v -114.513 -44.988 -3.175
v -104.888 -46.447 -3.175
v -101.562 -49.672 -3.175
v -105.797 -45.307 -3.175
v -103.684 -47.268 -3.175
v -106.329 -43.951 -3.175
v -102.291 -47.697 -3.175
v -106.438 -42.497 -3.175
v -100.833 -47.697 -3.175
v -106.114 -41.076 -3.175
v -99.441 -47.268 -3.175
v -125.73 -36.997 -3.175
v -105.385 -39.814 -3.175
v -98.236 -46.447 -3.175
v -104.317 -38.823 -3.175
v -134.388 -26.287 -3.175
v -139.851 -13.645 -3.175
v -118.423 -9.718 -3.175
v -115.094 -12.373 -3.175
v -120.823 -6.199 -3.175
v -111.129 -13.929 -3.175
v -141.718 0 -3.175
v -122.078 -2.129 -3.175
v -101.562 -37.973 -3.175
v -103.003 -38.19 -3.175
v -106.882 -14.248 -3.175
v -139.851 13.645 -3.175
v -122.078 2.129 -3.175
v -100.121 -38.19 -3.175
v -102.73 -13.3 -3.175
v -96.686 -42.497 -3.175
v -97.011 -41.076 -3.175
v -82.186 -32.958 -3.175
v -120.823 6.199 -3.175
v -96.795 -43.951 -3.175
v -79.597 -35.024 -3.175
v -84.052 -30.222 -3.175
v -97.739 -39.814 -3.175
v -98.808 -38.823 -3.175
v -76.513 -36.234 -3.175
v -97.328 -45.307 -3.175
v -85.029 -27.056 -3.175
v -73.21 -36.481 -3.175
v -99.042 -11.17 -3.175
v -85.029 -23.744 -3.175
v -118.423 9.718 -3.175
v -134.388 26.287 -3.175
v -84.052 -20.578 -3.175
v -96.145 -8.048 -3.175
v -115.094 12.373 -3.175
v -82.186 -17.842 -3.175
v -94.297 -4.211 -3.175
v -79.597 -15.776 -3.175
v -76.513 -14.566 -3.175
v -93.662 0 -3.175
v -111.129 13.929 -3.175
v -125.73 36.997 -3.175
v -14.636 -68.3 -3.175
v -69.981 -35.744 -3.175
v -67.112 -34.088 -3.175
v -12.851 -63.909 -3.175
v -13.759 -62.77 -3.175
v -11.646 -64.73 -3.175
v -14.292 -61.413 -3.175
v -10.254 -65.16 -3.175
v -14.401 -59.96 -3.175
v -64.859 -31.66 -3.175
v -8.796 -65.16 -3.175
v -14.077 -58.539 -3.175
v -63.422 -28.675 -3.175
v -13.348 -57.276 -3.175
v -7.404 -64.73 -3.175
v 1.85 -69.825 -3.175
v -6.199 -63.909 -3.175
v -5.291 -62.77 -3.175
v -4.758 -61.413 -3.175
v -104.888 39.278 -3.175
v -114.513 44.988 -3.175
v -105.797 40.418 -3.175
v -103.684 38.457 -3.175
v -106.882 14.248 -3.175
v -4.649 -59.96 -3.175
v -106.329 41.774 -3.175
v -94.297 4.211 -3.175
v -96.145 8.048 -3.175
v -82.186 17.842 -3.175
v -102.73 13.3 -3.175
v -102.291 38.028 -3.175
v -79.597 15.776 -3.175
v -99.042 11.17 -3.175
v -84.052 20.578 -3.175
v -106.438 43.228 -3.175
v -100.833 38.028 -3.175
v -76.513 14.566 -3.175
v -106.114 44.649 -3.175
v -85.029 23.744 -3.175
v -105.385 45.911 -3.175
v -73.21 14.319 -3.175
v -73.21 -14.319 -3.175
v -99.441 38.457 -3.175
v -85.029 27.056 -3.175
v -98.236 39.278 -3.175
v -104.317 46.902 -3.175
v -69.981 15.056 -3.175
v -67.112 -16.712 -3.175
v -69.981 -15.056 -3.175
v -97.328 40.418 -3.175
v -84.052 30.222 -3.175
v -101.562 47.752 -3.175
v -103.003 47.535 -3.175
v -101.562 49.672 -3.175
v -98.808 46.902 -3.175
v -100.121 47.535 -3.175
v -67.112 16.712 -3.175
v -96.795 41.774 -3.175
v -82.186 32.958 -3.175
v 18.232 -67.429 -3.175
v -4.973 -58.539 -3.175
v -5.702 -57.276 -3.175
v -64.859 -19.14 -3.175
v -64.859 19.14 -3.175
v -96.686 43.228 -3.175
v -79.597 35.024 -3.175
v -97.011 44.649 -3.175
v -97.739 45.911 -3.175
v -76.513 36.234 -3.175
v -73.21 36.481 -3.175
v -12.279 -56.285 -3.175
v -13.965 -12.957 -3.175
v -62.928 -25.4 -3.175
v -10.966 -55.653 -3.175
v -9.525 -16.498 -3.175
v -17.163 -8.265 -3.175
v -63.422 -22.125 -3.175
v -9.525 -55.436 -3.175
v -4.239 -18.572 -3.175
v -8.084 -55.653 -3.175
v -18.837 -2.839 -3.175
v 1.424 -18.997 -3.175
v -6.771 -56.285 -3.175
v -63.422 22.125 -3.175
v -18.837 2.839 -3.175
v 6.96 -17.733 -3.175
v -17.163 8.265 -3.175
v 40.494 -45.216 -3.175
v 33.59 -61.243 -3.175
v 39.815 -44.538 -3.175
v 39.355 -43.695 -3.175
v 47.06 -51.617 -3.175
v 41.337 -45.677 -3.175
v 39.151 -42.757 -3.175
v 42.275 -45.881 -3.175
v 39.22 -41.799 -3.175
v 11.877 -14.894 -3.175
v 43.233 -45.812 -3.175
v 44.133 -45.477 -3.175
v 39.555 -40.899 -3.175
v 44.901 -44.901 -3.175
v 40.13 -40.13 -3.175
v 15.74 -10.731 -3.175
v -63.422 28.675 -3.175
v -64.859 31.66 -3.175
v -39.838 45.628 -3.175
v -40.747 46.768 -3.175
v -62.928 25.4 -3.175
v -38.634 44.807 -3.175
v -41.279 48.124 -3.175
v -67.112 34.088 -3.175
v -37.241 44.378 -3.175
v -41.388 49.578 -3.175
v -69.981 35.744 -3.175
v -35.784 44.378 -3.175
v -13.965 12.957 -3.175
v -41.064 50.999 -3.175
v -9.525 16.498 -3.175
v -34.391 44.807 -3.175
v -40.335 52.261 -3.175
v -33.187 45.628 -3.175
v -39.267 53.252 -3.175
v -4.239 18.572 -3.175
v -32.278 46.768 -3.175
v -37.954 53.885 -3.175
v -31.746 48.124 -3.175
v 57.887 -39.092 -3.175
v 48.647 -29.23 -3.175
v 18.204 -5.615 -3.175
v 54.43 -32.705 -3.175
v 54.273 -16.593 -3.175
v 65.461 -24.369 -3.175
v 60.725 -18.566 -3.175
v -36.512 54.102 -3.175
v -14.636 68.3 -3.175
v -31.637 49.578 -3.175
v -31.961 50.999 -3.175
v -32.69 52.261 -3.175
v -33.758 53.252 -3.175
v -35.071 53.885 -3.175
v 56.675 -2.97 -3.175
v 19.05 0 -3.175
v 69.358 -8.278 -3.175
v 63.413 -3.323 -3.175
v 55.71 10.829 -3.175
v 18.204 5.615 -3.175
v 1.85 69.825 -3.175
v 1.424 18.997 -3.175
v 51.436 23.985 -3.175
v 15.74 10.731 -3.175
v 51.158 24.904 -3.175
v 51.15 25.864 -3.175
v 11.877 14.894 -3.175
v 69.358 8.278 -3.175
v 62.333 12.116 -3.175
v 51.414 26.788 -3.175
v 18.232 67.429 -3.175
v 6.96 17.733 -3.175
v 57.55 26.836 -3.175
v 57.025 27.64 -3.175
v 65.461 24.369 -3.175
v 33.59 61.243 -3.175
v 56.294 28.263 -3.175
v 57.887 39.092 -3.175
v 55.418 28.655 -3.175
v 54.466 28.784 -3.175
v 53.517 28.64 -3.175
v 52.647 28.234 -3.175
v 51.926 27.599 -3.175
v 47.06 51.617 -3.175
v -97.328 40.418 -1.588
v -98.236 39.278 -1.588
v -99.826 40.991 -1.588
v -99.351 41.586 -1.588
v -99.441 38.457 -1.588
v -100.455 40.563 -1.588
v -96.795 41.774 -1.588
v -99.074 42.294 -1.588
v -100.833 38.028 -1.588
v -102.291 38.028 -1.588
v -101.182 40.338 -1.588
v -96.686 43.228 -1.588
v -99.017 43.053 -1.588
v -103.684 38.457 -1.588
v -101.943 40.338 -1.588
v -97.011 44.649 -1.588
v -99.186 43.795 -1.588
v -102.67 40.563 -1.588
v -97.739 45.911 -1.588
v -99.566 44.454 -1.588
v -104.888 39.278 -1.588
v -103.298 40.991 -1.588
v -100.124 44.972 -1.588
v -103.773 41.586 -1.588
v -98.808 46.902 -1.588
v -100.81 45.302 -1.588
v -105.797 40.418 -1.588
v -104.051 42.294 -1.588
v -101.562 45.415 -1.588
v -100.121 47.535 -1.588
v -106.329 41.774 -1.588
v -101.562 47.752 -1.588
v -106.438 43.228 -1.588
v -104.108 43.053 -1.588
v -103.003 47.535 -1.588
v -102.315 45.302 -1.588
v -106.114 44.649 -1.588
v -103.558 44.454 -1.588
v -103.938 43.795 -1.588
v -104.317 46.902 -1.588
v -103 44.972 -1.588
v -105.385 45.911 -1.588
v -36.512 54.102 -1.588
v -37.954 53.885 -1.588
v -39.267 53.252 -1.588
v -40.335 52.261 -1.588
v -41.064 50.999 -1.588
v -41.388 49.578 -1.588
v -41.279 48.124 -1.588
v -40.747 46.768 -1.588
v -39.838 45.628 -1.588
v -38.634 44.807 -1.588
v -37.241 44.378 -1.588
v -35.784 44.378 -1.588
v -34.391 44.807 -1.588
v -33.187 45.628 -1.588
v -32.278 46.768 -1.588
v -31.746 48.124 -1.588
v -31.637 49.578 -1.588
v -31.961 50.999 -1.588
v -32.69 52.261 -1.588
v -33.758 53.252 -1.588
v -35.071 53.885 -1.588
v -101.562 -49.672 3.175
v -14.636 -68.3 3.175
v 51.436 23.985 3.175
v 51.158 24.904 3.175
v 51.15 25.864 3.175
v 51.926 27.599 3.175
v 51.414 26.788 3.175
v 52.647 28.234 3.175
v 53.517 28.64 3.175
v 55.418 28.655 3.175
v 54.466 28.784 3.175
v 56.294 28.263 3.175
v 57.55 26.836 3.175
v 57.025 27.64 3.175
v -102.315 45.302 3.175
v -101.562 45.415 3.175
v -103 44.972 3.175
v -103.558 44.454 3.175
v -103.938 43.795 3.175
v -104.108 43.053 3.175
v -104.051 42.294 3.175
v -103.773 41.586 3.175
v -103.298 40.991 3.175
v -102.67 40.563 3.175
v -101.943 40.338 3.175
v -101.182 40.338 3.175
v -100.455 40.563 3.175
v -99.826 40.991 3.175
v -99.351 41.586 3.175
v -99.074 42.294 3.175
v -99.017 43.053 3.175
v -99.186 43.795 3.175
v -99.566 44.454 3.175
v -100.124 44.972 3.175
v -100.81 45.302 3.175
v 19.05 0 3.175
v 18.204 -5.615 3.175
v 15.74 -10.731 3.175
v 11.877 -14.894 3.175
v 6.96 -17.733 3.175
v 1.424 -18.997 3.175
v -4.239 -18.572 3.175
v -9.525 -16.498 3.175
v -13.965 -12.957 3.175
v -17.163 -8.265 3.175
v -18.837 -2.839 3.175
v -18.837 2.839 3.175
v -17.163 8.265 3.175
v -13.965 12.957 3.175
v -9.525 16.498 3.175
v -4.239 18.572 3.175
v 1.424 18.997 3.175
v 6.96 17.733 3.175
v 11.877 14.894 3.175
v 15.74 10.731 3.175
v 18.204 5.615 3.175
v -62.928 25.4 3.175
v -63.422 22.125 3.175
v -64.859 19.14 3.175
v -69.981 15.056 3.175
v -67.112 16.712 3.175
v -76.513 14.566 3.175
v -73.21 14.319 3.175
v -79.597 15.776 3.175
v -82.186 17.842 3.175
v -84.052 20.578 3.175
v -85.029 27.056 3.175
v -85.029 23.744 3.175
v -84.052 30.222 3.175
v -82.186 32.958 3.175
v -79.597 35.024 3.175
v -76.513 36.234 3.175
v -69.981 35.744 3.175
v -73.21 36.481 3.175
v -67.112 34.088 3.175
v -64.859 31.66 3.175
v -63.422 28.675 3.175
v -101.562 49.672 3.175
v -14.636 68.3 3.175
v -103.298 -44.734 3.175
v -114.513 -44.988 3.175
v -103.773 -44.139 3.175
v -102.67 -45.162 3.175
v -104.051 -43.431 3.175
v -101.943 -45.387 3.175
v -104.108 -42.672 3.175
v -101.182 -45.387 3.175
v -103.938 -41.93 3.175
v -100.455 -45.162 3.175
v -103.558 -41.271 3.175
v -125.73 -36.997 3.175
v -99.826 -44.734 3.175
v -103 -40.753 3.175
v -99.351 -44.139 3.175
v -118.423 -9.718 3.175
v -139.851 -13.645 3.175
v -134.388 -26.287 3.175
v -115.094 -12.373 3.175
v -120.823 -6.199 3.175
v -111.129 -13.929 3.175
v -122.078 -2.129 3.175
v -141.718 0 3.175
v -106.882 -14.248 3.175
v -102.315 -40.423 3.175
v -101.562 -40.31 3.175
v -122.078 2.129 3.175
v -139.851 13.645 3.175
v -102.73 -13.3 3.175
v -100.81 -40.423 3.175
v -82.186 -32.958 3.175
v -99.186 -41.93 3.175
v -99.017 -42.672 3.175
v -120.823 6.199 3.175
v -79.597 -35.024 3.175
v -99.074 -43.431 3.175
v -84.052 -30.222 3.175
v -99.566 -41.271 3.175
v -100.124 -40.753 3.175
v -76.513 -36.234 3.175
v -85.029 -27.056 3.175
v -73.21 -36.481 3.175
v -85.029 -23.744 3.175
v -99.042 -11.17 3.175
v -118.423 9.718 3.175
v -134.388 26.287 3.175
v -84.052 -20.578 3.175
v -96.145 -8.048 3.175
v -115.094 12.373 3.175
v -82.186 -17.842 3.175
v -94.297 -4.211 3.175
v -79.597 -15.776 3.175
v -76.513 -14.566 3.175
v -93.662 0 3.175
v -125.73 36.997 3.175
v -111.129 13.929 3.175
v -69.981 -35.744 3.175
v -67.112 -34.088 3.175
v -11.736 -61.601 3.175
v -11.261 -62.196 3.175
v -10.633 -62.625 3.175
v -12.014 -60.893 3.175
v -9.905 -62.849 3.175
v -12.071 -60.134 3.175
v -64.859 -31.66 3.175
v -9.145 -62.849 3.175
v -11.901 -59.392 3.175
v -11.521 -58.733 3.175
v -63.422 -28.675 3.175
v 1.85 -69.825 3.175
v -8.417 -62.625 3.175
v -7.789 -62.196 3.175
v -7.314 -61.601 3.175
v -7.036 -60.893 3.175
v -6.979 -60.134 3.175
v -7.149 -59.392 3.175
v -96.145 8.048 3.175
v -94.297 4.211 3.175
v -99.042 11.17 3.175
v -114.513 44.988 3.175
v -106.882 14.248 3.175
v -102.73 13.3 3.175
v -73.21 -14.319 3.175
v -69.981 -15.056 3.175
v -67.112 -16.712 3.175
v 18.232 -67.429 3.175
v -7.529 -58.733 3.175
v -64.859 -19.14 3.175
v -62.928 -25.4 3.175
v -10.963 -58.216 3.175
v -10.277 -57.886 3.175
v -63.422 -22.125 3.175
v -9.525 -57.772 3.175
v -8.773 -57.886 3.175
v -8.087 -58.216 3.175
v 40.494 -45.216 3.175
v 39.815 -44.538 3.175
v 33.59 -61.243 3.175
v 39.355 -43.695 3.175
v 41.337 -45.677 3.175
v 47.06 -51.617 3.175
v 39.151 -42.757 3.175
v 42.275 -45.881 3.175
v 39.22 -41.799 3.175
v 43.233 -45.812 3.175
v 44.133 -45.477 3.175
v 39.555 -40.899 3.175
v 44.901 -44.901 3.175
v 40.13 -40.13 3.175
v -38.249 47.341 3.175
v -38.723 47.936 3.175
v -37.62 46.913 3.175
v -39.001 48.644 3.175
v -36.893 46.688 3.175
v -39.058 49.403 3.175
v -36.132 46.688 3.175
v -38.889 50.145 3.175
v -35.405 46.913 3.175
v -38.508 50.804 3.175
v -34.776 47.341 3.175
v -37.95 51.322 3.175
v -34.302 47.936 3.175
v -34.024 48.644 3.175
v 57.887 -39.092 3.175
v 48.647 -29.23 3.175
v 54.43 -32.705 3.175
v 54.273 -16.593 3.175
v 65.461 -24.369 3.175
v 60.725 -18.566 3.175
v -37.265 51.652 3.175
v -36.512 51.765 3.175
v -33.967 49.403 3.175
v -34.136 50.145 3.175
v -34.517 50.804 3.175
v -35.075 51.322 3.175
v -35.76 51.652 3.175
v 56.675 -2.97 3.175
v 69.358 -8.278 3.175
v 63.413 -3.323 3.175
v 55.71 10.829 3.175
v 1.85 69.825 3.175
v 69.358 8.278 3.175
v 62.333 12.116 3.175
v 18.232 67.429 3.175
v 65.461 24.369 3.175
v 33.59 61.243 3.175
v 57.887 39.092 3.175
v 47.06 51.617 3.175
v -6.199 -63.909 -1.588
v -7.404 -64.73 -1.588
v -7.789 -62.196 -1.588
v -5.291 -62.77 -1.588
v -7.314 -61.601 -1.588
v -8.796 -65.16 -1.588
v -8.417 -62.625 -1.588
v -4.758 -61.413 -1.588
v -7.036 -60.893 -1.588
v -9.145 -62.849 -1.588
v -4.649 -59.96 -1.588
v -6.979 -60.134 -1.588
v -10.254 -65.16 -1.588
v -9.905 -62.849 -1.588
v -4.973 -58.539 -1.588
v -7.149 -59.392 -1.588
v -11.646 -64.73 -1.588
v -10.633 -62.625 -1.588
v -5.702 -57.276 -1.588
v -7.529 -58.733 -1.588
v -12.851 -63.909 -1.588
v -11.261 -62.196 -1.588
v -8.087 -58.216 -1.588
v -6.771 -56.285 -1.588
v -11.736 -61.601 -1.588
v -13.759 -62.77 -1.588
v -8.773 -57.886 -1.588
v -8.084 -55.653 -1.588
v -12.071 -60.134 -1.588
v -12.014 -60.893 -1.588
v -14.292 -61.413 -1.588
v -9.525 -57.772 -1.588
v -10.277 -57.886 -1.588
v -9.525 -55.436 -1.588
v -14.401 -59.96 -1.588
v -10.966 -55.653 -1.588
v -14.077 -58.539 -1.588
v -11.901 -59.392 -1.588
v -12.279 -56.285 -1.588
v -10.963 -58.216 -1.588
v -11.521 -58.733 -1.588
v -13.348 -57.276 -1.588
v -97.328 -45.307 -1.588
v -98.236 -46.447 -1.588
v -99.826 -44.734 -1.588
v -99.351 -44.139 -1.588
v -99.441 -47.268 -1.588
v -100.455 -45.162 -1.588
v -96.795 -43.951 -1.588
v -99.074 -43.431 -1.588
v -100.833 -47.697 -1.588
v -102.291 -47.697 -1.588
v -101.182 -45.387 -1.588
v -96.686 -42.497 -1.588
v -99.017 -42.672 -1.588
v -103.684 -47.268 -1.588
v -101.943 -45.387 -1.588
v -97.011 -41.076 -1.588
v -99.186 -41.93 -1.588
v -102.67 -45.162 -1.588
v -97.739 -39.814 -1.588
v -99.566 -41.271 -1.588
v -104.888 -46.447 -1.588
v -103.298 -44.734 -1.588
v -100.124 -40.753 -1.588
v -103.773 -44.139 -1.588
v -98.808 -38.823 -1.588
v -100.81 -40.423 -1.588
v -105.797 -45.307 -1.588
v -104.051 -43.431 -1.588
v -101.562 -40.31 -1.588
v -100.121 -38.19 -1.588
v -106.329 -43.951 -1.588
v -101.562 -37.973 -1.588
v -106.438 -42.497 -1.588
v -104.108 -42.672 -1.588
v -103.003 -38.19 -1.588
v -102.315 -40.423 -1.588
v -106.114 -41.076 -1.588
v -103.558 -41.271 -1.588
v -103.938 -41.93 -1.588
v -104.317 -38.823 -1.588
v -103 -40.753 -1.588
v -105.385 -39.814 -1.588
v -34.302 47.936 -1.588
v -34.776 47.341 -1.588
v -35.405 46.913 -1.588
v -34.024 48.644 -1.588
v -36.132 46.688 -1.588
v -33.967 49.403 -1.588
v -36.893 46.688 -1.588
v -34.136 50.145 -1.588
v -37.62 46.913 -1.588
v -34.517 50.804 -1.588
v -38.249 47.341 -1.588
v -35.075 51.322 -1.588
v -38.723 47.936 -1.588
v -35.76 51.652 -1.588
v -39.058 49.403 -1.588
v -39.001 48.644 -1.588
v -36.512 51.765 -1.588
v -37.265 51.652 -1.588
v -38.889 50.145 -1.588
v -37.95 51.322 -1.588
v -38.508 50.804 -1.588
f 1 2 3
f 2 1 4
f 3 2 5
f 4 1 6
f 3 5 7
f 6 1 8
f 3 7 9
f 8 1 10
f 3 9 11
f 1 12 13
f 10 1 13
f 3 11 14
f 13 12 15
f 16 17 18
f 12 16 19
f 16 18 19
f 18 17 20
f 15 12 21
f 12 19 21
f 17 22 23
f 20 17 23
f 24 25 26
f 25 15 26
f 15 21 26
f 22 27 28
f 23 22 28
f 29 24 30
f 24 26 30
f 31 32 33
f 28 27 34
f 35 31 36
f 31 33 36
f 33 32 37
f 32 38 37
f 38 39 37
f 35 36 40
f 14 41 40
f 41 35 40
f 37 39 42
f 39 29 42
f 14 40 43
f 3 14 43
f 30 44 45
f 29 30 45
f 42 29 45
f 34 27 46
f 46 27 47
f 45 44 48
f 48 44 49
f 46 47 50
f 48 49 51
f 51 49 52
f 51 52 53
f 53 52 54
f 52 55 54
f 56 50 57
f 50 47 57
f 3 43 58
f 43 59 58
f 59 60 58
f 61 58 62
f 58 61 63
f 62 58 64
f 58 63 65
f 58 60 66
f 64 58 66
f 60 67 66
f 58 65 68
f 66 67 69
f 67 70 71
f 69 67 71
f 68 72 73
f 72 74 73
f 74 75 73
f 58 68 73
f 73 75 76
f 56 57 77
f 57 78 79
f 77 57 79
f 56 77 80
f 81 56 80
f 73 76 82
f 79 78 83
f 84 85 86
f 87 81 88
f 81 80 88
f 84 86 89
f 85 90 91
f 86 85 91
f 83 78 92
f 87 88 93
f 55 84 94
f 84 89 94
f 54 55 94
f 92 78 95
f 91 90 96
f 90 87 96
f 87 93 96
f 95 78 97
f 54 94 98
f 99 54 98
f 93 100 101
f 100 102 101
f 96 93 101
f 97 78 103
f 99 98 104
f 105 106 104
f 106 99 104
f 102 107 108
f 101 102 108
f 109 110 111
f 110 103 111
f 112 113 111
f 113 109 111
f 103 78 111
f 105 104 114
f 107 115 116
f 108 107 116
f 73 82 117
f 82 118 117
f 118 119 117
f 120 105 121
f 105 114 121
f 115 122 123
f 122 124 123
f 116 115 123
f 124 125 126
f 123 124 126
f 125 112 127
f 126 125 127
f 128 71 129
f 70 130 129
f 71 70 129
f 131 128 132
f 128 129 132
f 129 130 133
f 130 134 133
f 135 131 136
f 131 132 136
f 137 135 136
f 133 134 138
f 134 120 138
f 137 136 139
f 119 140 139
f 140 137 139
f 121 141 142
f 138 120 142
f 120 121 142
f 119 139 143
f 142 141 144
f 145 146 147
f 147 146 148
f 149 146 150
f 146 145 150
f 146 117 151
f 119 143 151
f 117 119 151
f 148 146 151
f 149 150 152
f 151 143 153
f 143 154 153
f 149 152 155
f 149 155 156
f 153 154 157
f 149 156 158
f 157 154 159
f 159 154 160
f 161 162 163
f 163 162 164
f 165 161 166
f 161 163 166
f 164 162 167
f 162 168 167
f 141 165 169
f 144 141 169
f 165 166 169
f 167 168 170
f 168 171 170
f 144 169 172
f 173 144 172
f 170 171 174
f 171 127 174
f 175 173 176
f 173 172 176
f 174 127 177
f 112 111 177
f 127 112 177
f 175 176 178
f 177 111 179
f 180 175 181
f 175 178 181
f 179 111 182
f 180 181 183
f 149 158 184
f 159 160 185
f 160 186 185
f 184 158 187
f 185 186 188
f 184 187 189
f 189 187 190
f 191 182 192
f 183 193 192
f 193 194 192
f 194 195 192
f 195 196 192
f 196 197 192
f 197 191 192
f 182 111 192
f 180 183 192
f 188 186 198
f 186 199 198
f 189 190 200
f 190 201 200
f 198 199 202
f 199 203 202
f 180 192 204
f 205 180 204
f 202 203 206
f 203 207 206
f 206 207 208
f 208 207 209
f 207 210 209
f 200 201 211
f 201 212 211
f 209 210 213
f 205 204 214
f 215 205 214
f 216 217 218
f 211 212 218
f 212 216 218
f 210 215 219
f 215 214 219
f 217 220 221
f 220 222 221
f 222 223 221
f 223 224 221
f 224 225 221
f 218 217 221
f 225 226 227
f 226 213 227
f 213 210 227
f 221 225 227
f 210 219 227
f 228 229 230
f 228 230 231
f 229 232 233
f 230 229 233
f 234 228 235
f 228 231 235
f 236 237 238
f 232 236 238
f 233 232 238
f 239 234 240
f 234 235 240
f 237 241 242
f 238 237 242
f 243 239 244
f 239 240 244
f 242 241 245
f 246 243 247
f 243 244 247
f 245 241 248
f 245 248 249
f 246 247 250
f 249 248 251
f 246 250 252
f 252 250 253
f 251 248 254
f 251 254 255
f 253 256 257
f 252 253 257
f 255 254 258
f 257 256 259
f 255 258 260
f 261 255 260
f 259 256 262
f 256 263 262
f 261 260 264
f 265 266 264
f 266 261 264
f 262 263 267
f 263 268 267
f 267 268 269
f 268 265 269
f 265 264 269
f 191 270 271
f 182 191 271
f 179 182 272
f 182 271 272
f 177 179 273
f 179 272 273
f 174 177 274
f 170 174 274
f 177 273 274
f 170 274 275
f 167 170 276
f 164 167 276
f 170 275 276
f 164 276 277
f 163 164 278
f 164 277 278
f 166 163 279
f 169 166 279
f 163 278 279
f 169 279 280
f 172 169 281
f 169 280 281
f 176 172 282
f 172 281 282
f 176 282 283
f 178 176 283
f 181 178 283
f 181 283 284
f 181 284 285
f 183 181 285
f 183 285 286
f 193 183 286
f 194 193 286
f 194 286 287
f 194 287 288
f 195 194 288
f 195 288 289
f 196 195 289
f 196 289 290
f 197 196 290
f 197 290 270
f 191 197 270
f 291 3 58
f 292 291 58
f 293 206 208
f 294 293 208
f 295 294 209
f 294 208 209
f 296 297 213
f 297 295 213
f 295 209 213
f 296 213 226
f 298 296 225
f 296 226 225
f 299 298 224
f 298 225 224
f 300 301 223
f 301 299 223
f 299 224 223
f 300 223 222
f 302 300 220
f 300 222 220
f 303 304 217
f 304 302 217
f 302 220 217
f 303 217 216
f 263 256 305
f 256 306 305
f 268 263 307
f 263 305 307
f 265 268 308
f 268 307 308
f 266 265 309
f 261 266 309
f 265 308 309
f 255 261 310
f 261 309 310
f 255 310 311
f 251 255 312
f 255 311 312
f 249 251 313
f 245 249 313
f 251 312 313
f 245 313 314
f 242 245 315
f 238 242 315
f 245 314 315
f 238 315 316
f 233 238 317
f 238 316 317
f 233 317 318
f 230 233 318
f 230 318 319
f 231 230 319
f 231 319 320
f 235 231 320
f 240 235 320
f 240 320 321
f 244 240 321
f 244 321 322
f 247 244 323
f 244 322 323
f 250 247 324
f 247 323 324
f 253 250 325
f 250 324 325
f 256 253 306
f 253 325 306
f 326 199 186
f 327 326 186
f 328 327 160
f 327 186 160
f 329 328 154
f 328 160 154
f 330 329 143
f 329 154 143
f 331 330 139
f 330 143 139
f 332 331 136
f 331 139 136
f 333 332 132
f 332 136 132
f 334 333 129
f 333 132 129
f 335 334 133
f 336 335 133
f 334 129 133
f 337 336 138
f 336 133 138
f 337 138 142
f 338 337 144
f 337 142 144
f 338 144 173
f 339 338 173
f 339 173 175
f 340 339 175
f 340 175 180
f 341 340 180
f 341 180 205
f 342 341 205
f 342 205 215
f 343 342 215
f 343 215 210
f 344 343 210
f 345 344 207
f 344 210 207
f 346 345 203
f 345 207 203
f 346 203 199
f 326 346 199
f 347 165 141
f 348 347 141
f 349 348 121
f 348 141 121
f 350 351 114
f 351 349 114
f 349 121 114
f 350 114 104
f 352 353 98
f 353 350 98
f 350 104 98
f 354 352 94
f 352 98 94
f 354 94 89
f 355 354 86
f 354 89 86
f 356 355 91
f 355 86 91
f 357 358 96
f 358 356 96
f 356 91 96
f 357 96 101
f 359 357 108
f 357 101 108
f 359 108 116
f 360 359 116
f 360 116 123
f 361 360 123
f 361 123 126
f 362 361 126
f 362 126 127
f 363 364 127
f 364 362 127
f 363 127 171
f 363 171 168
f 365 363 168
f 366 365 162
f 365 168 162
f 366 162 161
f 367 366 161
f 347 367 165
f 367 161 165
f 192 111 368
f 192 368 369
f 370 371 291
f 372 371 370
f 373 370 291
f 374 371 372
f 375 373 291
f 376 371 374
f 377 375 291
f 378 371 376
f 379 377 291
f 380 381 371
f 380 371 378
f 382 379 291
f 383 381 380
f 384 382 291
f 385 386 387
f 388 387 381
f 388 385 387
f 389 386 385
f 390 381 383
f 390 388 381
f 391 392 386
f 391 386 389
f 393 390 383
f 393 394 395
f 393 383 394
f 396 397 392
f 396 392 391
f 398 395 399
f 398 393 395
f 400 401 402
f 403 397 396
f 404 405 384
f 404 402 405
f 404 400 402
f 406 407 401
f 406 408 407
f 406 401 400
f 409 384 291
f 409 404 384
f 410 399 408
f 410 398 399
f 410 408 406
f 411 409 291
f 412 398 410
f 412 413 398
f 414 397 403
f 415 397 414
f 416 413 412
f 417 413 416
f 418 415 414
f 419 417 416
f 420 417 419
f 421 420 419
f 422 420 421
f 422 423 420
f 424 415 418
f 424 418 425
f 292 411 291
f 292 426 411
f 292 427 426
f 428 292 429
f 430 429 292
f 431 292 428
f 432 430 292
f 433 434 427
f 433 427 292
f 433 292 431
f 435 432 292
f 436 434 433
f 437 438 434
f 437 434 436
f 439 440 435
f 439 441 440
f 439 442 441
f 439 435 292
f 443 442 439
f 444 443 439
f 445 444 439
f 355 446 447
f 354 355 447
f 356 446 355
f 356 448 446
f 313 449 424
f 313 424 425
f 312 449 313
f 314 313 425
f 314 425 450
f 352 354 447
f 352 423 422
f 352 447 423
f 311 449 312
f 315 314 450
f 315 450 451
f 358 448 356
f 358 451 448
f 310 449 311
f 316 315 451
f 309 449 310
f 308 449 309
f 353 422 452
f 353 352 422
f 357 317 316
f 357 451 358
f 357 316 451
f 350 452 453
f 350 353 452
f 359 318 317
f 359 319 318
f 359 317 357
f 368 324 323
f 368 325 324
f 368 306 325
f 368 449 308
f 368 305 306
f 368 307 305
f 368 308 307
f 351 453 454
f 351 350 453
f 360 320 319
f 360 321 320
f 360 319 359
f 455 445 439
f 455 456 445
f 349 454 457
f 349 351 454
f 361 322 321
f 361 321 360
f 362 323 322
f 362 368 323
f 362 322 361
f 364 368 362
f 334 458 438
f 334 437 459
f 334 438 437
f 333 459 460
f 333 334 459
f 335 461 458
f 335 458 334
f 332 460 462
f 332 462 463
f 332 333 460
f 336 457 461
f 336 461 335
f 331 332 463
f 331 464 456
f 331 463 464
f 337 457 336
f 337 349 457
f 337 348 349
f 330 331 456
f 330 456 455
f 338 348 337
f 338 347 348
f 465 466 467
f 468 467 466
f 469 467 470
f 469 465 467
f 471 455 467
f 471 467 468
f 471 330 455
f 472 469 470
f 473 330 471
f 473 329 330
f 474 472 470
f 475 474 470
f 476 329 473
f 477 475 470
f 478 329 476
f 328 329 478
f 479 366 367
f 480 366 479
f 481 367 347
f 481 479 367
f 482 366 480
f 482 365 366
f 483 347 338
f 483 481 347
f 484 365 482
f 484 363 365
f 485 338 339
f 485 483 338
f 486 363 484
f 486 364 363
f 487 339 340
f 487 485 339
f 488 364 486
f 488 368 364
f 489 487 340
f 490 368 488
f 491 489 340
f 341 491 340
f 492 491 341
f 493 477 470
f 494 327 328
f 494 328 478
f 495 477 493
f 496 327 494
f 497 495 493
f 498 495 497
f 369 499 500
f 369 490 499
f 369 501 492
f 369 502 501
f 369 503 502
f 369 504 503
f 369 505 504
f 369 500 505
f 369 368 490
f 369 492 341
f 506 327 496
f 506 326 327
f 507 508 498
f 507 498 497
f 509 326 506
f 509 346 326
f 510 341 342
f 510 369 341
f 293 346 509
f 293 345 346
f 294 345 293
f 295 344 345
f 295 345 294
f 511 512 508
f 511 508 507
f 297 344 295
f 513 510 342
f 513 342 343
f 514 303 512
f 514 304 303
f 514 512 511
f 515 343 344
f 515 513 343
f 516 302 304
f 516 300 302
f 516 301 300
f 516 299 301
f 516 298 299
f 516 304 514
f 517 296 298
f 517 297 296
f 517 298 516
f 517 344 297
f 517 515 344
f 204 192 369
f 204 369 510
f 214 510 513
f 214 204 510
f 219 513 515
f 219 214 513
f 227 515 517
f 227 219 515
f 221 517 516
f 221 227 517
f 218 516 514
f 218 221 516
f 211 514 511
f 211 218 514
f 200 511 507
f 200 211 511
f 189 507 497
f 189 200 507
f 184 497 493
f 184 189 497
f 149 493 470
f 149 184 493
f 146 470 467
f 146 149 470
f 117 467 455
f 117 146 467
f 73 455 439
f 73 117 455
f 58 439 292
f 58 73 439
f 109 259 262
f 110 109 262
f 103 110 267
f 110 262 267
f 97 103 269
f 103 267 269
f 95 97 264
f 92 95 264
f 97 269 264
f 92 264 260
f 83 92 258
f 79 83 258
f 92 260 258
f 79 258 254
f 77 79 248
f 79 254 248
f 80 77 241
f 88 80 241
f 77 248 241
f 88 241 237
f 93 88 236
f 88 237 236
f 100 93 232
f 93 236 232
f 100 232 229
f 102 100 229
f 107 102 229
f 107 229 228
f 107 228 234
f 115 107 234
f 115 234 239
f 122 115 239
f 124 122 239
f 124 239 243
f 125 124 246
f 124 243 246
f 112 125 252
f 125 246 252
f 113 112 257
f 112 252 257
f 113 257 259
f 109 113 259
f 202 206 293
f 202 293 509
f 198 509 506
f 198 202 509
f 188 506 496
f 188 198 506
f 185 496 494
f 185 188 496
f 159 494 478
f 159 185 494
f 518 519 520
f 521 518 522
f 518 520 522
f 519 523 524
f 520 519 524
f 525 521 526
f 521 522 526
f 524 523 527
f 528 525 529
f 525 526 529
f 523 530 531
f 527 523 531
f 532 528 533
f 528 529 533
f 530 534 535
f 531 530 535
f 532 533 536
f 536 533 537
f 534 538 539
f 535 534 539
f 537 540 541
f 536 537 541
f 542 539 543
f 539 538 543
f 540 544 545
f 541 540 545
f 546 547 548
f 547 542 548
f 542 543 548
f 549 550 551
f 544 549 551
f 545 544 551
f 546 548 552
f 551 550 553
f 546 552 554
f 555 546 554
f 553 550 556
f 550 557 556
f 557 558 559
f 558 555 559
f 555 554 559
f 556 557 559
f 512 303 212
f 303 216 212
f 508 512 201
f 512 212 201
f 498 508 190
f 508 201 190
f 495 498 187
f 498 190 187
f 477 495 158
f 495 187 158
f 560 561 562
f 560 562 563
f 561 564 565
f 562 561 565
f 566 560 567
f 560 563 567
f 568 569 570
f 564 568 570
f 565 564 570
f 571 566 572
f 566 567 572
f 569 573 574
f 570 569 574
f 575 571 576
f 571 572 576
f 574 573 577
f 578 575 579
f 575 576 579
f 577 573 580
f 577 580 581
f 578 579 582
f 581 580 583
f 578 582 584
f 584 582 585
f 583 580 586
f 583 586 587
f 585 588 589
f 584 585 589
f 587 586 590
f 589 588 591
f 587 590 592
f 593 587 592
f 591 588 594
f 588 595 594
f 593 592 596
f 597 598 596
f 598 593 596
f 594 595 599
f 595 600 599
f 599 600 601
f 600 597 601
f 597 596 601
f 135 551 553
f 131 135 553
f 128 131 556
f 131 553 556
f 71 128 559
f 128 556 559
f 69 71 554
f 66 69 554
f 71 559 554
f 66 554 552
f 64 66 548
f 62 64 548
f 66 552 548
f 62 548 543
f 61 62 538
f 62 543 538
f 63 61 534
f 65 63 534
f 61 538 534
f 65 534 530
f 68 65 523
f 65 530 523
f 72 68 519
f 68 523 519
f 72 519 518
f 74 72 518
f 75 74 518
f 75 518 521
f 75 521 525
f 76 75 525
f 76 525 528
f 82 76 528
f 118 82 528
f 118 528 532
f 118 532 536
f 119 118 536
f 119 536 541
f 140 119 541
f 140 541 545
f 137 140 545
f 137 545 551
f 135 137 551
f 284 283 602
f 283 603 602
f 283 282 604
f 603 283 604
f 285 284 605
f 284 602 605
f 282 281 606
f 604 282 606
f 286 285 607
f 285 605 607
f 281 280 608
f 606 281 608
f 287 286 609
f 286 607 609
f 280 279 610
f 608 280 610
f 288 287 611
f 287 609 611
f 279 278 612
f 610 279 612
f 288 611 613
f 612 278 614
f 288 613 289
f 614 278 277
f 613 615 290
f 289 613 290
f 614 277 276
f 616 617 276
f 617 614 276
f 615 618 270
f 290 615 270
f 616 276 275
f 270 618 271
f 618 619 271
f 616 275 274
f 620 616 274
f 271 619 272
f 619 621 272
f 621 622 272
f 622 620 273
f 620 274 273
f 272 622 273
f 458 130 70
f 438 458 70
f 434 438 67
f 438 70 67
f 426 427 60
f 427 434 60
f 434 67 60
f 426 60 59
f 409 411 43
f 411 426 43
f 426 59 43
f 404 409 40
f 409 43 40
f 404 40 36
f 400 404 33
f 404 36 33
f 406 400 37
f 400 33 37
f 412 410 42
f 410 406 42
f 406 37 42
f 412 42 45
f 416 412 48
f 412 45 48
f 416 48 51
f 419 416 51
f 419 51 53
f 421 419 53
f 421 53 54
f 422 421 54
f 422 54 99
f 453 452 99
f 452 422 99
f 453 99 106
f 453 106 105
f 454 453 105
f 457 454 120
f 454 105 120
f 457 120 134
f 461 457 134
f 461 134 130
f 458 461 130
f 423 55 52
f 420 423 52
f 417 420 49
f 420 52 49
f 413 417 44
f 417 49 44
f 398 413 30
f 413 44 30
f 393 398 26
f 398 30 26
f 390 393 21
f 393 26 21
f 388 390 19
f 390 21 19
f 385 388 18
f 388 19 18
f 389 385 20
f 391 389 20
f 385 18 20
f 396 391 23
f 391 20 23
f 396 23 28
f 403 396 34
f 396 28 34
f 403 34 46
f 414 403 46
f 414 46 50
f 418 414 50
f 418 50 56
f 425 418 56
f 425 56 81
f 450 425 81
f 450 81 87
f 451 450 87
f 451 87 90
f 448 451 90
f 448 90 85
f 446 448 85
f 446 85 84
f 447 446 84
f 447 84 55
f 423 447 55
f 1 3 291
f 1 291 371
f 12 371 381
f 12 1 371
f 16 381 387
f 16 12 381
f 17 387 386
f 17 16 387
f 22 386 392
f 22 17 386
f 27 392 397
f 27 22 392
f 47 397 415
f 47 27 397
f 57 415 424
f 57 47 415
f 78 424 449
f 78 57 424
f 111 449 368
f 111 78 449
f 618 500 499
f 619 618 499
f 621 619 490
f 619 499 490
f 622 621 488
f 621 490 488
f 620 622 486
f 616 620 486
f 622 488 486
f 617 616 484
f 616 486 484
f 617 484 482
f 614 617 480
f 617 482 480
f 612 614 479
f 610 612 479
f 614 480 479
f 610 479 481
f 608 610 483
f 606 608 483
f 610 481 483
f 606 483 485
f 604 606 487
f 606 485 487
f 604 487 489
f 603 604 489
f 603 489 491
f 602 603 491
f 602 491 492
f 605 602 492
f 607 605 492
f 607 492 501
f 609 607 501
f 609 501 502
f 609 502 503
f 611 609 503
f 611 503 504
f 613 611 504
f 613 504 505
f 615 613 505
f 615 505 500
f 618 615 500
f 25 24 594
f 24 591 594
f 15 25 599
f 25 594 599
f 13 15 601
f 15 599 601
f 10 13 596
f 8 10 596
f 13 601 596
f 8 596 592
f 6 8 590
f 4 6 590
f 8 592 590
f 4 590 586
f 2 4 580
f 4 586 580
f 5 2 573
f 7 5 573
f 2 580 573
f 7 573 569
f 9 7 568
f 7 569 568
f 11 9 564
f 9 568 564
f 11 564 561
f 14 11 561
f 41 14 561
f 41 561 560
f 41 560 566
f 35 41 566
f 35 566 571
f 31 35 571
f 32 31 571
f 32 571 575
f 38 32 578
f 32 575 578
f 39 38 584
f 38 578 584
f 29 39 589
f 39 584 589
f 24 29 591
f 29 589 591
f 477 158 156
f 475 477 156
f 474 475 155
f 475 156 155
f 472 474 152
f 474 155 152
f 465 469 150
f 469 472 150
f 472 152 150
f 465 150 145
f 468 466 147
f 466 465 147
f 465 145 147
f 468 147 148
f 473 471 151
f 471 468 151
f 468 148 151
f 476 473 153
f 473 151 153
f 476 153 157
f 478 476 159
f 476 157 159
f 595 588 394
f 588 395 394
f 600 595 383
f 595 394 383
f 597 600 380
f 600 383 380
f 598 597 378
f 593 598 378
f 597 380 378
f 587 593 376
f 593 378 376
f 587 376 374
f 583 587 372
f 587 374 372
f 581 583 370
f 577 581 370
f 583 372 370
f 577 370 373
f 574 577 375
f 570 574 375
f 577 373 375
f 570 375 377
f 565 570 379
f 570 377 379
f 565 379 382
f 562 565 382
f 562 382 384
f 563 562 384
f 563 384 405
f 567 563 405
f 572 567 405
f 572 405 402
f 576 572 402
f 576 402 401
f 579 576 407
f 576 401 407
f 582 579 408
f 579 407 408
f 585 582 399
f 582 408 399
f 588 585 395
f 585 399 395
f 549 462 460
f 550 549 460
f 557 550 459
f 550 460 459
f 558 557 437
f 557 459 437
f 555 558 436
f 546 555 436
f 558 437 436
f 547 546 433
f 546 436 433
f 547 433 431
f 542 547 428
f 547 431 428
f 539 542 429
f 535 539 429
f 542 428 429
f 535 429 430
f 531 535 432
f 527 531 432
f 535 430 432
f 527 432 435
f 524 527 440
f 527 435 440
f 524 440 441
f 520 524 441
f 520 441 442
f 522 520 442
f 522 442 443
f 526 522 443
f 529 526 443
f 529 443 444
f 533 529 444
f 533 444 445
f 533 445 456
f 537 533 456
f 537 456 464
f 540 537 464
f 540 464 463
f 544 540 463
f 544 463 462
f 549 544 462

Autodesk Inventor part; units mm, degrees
ref_plane "YZ Plane" through (0, 0, 0) normal (1, 0, 0) x (0, 1, 0)
ref_plane "XZ Plane" through (0, 0, 0) normal (0, 1, 0) x (-1, 0, 0)
ref_plane "XY Plane" through (0, 0, 0) normal (0, 0, 1) x (1, 0, 0)
sketch "Sketch1" plane through (0, 0, 0) normal (0, 0, 1) x (1, 0, 0)
  line L0 (-184.0318, 0) -> (112.1636, 0) projected
  line L1 (0, -97.79) -> (0, 97.79) projected
  circle A0 centre (0, 0) radius 50.8 construction
  arc A1 (-14.6356, -68.2995) -> (-14.6356, 68.2995) centre (0, 0) ccw
  arc A2 (44.9013, -44.9013) -> (57.5505, 26.8363) centre (0, 0) ccw
  arc A3 (40.1305, -40.1305) -> (51.4358, 23.9849) centre (0, 0) ccw
  line L2 (0, 0) -> (57.5505, 26.8363) construction
  line L3 (0, 0) -> (44.9013, -44.9013) construction
  arc A4 (57.5505, 26.8363) -> (51.4358, 23.9849) centre (54.4932, 25.4106) ccw
  arc A5 (40.1305, -40.1305) -> (44.9013, -44.9013) centre (42.5159, -42.5159) ccw
  arc A6 (-101.5622, 49.6724) -> (-101.5622, -49.6724) centre (-90.9182, 0) ccw
  line L4 (-101.5622, 49.6724) -> (-14.6356, 68.2995)
  line L5 (-101.5622, -49.6724) -> (-14.6356, -68.2995)
  circle A7 centre (-74.0404, 25.4) radius 11.1125
  circle A8 centre (-74.0404, -25.4) radius 11.1125
  circle A9 centre (0, 0) radius 19.05
  circle A10 centre (-107.95, 0) radius 14.2875
  line L6 (-107.95, -14.2875) -> (-107.95, 14.2875) construction
  dimension "d0" = 101.6
  dimension "d1" = 19.05
  dimension "d2" = 6.7469
  dimension "d3" = 6.35
  dimension "d4" = 45
  dimension "d5" = 25
  dimension "d10" = 22.225
  dimension "d11" = 38.1
  dimension "d24" = 50.8
  dimension "d33" = 88.9
  dimension "d34" = 107.95
  dimension "d35" = 28.575
extrude "Extrusion1" add sketch "Sketch1" along normal mid plane 6.35 contours A6 L4 A1 L1 A9 L0 A10 | L0 A10 A9 L1 A1 L5 A6 | A1 L0 A2 A4 A3 A9 L1 | L1 A9 L0 A3 A5 A2 A1
sketch "Sketch2" plane through (0, 0, -3.175) normal (0, 0, -1) x (-1, 0, 0)
  line L0 (184.0318, 0) -> (-112.1636, 0) projected
  line L1 (0, -97.79) -> (0, 97.79) projected
  point P0 (36.5125, 49.2125)
  point P1 (9.525, -60.325)
  dimension "d15" = 49.2125
  dimension "d16" = 36.5125
  dimension "d39" = 9.525
  dimension "d40" = 60.325
hole "Hole1" at (-36.5125, 49.2125, -3.175) at (-9.525, -60.325, -3.175) direction (0, 0, 1) diameter 5.1054 end through all counterbore diameter 9.779 counterbore depth 1.5875 clearance for "Flat Head Machine Screw (82)" size "#10" standard "Ansi Unified Screw Threads"
sketch "Sketch3" plane through (0, 0, -3.175) normal (0, 0, -1) x (-1, 0, 0)
  line L0 (101.5622, -49.6724) -> (101.5622, 49.6724) construction
  line L1 (184.0318, 0) -> (-112.1636, 0) projected
  line L2 (0, -97.79) -> (0, 97.79) projected
  point P0 (101.5622, 42.8625)
  point P1 (101.5622, -42.8625)
  dimension "d25" = 42.8625
hole "Hole2" at (-101.5622, 42.8625, -3.175) at (-101.5622, -42.8625, -3.175) direction (0, 0, 1) diameter 5.1054 end through all counterbore diameter 9.779 counterbore depth 1.5875 clearance for "Flat Head Machine Screw (82)" size "#10" standard "Ansi Unified Screw Threads"
properties part number "front plate"
